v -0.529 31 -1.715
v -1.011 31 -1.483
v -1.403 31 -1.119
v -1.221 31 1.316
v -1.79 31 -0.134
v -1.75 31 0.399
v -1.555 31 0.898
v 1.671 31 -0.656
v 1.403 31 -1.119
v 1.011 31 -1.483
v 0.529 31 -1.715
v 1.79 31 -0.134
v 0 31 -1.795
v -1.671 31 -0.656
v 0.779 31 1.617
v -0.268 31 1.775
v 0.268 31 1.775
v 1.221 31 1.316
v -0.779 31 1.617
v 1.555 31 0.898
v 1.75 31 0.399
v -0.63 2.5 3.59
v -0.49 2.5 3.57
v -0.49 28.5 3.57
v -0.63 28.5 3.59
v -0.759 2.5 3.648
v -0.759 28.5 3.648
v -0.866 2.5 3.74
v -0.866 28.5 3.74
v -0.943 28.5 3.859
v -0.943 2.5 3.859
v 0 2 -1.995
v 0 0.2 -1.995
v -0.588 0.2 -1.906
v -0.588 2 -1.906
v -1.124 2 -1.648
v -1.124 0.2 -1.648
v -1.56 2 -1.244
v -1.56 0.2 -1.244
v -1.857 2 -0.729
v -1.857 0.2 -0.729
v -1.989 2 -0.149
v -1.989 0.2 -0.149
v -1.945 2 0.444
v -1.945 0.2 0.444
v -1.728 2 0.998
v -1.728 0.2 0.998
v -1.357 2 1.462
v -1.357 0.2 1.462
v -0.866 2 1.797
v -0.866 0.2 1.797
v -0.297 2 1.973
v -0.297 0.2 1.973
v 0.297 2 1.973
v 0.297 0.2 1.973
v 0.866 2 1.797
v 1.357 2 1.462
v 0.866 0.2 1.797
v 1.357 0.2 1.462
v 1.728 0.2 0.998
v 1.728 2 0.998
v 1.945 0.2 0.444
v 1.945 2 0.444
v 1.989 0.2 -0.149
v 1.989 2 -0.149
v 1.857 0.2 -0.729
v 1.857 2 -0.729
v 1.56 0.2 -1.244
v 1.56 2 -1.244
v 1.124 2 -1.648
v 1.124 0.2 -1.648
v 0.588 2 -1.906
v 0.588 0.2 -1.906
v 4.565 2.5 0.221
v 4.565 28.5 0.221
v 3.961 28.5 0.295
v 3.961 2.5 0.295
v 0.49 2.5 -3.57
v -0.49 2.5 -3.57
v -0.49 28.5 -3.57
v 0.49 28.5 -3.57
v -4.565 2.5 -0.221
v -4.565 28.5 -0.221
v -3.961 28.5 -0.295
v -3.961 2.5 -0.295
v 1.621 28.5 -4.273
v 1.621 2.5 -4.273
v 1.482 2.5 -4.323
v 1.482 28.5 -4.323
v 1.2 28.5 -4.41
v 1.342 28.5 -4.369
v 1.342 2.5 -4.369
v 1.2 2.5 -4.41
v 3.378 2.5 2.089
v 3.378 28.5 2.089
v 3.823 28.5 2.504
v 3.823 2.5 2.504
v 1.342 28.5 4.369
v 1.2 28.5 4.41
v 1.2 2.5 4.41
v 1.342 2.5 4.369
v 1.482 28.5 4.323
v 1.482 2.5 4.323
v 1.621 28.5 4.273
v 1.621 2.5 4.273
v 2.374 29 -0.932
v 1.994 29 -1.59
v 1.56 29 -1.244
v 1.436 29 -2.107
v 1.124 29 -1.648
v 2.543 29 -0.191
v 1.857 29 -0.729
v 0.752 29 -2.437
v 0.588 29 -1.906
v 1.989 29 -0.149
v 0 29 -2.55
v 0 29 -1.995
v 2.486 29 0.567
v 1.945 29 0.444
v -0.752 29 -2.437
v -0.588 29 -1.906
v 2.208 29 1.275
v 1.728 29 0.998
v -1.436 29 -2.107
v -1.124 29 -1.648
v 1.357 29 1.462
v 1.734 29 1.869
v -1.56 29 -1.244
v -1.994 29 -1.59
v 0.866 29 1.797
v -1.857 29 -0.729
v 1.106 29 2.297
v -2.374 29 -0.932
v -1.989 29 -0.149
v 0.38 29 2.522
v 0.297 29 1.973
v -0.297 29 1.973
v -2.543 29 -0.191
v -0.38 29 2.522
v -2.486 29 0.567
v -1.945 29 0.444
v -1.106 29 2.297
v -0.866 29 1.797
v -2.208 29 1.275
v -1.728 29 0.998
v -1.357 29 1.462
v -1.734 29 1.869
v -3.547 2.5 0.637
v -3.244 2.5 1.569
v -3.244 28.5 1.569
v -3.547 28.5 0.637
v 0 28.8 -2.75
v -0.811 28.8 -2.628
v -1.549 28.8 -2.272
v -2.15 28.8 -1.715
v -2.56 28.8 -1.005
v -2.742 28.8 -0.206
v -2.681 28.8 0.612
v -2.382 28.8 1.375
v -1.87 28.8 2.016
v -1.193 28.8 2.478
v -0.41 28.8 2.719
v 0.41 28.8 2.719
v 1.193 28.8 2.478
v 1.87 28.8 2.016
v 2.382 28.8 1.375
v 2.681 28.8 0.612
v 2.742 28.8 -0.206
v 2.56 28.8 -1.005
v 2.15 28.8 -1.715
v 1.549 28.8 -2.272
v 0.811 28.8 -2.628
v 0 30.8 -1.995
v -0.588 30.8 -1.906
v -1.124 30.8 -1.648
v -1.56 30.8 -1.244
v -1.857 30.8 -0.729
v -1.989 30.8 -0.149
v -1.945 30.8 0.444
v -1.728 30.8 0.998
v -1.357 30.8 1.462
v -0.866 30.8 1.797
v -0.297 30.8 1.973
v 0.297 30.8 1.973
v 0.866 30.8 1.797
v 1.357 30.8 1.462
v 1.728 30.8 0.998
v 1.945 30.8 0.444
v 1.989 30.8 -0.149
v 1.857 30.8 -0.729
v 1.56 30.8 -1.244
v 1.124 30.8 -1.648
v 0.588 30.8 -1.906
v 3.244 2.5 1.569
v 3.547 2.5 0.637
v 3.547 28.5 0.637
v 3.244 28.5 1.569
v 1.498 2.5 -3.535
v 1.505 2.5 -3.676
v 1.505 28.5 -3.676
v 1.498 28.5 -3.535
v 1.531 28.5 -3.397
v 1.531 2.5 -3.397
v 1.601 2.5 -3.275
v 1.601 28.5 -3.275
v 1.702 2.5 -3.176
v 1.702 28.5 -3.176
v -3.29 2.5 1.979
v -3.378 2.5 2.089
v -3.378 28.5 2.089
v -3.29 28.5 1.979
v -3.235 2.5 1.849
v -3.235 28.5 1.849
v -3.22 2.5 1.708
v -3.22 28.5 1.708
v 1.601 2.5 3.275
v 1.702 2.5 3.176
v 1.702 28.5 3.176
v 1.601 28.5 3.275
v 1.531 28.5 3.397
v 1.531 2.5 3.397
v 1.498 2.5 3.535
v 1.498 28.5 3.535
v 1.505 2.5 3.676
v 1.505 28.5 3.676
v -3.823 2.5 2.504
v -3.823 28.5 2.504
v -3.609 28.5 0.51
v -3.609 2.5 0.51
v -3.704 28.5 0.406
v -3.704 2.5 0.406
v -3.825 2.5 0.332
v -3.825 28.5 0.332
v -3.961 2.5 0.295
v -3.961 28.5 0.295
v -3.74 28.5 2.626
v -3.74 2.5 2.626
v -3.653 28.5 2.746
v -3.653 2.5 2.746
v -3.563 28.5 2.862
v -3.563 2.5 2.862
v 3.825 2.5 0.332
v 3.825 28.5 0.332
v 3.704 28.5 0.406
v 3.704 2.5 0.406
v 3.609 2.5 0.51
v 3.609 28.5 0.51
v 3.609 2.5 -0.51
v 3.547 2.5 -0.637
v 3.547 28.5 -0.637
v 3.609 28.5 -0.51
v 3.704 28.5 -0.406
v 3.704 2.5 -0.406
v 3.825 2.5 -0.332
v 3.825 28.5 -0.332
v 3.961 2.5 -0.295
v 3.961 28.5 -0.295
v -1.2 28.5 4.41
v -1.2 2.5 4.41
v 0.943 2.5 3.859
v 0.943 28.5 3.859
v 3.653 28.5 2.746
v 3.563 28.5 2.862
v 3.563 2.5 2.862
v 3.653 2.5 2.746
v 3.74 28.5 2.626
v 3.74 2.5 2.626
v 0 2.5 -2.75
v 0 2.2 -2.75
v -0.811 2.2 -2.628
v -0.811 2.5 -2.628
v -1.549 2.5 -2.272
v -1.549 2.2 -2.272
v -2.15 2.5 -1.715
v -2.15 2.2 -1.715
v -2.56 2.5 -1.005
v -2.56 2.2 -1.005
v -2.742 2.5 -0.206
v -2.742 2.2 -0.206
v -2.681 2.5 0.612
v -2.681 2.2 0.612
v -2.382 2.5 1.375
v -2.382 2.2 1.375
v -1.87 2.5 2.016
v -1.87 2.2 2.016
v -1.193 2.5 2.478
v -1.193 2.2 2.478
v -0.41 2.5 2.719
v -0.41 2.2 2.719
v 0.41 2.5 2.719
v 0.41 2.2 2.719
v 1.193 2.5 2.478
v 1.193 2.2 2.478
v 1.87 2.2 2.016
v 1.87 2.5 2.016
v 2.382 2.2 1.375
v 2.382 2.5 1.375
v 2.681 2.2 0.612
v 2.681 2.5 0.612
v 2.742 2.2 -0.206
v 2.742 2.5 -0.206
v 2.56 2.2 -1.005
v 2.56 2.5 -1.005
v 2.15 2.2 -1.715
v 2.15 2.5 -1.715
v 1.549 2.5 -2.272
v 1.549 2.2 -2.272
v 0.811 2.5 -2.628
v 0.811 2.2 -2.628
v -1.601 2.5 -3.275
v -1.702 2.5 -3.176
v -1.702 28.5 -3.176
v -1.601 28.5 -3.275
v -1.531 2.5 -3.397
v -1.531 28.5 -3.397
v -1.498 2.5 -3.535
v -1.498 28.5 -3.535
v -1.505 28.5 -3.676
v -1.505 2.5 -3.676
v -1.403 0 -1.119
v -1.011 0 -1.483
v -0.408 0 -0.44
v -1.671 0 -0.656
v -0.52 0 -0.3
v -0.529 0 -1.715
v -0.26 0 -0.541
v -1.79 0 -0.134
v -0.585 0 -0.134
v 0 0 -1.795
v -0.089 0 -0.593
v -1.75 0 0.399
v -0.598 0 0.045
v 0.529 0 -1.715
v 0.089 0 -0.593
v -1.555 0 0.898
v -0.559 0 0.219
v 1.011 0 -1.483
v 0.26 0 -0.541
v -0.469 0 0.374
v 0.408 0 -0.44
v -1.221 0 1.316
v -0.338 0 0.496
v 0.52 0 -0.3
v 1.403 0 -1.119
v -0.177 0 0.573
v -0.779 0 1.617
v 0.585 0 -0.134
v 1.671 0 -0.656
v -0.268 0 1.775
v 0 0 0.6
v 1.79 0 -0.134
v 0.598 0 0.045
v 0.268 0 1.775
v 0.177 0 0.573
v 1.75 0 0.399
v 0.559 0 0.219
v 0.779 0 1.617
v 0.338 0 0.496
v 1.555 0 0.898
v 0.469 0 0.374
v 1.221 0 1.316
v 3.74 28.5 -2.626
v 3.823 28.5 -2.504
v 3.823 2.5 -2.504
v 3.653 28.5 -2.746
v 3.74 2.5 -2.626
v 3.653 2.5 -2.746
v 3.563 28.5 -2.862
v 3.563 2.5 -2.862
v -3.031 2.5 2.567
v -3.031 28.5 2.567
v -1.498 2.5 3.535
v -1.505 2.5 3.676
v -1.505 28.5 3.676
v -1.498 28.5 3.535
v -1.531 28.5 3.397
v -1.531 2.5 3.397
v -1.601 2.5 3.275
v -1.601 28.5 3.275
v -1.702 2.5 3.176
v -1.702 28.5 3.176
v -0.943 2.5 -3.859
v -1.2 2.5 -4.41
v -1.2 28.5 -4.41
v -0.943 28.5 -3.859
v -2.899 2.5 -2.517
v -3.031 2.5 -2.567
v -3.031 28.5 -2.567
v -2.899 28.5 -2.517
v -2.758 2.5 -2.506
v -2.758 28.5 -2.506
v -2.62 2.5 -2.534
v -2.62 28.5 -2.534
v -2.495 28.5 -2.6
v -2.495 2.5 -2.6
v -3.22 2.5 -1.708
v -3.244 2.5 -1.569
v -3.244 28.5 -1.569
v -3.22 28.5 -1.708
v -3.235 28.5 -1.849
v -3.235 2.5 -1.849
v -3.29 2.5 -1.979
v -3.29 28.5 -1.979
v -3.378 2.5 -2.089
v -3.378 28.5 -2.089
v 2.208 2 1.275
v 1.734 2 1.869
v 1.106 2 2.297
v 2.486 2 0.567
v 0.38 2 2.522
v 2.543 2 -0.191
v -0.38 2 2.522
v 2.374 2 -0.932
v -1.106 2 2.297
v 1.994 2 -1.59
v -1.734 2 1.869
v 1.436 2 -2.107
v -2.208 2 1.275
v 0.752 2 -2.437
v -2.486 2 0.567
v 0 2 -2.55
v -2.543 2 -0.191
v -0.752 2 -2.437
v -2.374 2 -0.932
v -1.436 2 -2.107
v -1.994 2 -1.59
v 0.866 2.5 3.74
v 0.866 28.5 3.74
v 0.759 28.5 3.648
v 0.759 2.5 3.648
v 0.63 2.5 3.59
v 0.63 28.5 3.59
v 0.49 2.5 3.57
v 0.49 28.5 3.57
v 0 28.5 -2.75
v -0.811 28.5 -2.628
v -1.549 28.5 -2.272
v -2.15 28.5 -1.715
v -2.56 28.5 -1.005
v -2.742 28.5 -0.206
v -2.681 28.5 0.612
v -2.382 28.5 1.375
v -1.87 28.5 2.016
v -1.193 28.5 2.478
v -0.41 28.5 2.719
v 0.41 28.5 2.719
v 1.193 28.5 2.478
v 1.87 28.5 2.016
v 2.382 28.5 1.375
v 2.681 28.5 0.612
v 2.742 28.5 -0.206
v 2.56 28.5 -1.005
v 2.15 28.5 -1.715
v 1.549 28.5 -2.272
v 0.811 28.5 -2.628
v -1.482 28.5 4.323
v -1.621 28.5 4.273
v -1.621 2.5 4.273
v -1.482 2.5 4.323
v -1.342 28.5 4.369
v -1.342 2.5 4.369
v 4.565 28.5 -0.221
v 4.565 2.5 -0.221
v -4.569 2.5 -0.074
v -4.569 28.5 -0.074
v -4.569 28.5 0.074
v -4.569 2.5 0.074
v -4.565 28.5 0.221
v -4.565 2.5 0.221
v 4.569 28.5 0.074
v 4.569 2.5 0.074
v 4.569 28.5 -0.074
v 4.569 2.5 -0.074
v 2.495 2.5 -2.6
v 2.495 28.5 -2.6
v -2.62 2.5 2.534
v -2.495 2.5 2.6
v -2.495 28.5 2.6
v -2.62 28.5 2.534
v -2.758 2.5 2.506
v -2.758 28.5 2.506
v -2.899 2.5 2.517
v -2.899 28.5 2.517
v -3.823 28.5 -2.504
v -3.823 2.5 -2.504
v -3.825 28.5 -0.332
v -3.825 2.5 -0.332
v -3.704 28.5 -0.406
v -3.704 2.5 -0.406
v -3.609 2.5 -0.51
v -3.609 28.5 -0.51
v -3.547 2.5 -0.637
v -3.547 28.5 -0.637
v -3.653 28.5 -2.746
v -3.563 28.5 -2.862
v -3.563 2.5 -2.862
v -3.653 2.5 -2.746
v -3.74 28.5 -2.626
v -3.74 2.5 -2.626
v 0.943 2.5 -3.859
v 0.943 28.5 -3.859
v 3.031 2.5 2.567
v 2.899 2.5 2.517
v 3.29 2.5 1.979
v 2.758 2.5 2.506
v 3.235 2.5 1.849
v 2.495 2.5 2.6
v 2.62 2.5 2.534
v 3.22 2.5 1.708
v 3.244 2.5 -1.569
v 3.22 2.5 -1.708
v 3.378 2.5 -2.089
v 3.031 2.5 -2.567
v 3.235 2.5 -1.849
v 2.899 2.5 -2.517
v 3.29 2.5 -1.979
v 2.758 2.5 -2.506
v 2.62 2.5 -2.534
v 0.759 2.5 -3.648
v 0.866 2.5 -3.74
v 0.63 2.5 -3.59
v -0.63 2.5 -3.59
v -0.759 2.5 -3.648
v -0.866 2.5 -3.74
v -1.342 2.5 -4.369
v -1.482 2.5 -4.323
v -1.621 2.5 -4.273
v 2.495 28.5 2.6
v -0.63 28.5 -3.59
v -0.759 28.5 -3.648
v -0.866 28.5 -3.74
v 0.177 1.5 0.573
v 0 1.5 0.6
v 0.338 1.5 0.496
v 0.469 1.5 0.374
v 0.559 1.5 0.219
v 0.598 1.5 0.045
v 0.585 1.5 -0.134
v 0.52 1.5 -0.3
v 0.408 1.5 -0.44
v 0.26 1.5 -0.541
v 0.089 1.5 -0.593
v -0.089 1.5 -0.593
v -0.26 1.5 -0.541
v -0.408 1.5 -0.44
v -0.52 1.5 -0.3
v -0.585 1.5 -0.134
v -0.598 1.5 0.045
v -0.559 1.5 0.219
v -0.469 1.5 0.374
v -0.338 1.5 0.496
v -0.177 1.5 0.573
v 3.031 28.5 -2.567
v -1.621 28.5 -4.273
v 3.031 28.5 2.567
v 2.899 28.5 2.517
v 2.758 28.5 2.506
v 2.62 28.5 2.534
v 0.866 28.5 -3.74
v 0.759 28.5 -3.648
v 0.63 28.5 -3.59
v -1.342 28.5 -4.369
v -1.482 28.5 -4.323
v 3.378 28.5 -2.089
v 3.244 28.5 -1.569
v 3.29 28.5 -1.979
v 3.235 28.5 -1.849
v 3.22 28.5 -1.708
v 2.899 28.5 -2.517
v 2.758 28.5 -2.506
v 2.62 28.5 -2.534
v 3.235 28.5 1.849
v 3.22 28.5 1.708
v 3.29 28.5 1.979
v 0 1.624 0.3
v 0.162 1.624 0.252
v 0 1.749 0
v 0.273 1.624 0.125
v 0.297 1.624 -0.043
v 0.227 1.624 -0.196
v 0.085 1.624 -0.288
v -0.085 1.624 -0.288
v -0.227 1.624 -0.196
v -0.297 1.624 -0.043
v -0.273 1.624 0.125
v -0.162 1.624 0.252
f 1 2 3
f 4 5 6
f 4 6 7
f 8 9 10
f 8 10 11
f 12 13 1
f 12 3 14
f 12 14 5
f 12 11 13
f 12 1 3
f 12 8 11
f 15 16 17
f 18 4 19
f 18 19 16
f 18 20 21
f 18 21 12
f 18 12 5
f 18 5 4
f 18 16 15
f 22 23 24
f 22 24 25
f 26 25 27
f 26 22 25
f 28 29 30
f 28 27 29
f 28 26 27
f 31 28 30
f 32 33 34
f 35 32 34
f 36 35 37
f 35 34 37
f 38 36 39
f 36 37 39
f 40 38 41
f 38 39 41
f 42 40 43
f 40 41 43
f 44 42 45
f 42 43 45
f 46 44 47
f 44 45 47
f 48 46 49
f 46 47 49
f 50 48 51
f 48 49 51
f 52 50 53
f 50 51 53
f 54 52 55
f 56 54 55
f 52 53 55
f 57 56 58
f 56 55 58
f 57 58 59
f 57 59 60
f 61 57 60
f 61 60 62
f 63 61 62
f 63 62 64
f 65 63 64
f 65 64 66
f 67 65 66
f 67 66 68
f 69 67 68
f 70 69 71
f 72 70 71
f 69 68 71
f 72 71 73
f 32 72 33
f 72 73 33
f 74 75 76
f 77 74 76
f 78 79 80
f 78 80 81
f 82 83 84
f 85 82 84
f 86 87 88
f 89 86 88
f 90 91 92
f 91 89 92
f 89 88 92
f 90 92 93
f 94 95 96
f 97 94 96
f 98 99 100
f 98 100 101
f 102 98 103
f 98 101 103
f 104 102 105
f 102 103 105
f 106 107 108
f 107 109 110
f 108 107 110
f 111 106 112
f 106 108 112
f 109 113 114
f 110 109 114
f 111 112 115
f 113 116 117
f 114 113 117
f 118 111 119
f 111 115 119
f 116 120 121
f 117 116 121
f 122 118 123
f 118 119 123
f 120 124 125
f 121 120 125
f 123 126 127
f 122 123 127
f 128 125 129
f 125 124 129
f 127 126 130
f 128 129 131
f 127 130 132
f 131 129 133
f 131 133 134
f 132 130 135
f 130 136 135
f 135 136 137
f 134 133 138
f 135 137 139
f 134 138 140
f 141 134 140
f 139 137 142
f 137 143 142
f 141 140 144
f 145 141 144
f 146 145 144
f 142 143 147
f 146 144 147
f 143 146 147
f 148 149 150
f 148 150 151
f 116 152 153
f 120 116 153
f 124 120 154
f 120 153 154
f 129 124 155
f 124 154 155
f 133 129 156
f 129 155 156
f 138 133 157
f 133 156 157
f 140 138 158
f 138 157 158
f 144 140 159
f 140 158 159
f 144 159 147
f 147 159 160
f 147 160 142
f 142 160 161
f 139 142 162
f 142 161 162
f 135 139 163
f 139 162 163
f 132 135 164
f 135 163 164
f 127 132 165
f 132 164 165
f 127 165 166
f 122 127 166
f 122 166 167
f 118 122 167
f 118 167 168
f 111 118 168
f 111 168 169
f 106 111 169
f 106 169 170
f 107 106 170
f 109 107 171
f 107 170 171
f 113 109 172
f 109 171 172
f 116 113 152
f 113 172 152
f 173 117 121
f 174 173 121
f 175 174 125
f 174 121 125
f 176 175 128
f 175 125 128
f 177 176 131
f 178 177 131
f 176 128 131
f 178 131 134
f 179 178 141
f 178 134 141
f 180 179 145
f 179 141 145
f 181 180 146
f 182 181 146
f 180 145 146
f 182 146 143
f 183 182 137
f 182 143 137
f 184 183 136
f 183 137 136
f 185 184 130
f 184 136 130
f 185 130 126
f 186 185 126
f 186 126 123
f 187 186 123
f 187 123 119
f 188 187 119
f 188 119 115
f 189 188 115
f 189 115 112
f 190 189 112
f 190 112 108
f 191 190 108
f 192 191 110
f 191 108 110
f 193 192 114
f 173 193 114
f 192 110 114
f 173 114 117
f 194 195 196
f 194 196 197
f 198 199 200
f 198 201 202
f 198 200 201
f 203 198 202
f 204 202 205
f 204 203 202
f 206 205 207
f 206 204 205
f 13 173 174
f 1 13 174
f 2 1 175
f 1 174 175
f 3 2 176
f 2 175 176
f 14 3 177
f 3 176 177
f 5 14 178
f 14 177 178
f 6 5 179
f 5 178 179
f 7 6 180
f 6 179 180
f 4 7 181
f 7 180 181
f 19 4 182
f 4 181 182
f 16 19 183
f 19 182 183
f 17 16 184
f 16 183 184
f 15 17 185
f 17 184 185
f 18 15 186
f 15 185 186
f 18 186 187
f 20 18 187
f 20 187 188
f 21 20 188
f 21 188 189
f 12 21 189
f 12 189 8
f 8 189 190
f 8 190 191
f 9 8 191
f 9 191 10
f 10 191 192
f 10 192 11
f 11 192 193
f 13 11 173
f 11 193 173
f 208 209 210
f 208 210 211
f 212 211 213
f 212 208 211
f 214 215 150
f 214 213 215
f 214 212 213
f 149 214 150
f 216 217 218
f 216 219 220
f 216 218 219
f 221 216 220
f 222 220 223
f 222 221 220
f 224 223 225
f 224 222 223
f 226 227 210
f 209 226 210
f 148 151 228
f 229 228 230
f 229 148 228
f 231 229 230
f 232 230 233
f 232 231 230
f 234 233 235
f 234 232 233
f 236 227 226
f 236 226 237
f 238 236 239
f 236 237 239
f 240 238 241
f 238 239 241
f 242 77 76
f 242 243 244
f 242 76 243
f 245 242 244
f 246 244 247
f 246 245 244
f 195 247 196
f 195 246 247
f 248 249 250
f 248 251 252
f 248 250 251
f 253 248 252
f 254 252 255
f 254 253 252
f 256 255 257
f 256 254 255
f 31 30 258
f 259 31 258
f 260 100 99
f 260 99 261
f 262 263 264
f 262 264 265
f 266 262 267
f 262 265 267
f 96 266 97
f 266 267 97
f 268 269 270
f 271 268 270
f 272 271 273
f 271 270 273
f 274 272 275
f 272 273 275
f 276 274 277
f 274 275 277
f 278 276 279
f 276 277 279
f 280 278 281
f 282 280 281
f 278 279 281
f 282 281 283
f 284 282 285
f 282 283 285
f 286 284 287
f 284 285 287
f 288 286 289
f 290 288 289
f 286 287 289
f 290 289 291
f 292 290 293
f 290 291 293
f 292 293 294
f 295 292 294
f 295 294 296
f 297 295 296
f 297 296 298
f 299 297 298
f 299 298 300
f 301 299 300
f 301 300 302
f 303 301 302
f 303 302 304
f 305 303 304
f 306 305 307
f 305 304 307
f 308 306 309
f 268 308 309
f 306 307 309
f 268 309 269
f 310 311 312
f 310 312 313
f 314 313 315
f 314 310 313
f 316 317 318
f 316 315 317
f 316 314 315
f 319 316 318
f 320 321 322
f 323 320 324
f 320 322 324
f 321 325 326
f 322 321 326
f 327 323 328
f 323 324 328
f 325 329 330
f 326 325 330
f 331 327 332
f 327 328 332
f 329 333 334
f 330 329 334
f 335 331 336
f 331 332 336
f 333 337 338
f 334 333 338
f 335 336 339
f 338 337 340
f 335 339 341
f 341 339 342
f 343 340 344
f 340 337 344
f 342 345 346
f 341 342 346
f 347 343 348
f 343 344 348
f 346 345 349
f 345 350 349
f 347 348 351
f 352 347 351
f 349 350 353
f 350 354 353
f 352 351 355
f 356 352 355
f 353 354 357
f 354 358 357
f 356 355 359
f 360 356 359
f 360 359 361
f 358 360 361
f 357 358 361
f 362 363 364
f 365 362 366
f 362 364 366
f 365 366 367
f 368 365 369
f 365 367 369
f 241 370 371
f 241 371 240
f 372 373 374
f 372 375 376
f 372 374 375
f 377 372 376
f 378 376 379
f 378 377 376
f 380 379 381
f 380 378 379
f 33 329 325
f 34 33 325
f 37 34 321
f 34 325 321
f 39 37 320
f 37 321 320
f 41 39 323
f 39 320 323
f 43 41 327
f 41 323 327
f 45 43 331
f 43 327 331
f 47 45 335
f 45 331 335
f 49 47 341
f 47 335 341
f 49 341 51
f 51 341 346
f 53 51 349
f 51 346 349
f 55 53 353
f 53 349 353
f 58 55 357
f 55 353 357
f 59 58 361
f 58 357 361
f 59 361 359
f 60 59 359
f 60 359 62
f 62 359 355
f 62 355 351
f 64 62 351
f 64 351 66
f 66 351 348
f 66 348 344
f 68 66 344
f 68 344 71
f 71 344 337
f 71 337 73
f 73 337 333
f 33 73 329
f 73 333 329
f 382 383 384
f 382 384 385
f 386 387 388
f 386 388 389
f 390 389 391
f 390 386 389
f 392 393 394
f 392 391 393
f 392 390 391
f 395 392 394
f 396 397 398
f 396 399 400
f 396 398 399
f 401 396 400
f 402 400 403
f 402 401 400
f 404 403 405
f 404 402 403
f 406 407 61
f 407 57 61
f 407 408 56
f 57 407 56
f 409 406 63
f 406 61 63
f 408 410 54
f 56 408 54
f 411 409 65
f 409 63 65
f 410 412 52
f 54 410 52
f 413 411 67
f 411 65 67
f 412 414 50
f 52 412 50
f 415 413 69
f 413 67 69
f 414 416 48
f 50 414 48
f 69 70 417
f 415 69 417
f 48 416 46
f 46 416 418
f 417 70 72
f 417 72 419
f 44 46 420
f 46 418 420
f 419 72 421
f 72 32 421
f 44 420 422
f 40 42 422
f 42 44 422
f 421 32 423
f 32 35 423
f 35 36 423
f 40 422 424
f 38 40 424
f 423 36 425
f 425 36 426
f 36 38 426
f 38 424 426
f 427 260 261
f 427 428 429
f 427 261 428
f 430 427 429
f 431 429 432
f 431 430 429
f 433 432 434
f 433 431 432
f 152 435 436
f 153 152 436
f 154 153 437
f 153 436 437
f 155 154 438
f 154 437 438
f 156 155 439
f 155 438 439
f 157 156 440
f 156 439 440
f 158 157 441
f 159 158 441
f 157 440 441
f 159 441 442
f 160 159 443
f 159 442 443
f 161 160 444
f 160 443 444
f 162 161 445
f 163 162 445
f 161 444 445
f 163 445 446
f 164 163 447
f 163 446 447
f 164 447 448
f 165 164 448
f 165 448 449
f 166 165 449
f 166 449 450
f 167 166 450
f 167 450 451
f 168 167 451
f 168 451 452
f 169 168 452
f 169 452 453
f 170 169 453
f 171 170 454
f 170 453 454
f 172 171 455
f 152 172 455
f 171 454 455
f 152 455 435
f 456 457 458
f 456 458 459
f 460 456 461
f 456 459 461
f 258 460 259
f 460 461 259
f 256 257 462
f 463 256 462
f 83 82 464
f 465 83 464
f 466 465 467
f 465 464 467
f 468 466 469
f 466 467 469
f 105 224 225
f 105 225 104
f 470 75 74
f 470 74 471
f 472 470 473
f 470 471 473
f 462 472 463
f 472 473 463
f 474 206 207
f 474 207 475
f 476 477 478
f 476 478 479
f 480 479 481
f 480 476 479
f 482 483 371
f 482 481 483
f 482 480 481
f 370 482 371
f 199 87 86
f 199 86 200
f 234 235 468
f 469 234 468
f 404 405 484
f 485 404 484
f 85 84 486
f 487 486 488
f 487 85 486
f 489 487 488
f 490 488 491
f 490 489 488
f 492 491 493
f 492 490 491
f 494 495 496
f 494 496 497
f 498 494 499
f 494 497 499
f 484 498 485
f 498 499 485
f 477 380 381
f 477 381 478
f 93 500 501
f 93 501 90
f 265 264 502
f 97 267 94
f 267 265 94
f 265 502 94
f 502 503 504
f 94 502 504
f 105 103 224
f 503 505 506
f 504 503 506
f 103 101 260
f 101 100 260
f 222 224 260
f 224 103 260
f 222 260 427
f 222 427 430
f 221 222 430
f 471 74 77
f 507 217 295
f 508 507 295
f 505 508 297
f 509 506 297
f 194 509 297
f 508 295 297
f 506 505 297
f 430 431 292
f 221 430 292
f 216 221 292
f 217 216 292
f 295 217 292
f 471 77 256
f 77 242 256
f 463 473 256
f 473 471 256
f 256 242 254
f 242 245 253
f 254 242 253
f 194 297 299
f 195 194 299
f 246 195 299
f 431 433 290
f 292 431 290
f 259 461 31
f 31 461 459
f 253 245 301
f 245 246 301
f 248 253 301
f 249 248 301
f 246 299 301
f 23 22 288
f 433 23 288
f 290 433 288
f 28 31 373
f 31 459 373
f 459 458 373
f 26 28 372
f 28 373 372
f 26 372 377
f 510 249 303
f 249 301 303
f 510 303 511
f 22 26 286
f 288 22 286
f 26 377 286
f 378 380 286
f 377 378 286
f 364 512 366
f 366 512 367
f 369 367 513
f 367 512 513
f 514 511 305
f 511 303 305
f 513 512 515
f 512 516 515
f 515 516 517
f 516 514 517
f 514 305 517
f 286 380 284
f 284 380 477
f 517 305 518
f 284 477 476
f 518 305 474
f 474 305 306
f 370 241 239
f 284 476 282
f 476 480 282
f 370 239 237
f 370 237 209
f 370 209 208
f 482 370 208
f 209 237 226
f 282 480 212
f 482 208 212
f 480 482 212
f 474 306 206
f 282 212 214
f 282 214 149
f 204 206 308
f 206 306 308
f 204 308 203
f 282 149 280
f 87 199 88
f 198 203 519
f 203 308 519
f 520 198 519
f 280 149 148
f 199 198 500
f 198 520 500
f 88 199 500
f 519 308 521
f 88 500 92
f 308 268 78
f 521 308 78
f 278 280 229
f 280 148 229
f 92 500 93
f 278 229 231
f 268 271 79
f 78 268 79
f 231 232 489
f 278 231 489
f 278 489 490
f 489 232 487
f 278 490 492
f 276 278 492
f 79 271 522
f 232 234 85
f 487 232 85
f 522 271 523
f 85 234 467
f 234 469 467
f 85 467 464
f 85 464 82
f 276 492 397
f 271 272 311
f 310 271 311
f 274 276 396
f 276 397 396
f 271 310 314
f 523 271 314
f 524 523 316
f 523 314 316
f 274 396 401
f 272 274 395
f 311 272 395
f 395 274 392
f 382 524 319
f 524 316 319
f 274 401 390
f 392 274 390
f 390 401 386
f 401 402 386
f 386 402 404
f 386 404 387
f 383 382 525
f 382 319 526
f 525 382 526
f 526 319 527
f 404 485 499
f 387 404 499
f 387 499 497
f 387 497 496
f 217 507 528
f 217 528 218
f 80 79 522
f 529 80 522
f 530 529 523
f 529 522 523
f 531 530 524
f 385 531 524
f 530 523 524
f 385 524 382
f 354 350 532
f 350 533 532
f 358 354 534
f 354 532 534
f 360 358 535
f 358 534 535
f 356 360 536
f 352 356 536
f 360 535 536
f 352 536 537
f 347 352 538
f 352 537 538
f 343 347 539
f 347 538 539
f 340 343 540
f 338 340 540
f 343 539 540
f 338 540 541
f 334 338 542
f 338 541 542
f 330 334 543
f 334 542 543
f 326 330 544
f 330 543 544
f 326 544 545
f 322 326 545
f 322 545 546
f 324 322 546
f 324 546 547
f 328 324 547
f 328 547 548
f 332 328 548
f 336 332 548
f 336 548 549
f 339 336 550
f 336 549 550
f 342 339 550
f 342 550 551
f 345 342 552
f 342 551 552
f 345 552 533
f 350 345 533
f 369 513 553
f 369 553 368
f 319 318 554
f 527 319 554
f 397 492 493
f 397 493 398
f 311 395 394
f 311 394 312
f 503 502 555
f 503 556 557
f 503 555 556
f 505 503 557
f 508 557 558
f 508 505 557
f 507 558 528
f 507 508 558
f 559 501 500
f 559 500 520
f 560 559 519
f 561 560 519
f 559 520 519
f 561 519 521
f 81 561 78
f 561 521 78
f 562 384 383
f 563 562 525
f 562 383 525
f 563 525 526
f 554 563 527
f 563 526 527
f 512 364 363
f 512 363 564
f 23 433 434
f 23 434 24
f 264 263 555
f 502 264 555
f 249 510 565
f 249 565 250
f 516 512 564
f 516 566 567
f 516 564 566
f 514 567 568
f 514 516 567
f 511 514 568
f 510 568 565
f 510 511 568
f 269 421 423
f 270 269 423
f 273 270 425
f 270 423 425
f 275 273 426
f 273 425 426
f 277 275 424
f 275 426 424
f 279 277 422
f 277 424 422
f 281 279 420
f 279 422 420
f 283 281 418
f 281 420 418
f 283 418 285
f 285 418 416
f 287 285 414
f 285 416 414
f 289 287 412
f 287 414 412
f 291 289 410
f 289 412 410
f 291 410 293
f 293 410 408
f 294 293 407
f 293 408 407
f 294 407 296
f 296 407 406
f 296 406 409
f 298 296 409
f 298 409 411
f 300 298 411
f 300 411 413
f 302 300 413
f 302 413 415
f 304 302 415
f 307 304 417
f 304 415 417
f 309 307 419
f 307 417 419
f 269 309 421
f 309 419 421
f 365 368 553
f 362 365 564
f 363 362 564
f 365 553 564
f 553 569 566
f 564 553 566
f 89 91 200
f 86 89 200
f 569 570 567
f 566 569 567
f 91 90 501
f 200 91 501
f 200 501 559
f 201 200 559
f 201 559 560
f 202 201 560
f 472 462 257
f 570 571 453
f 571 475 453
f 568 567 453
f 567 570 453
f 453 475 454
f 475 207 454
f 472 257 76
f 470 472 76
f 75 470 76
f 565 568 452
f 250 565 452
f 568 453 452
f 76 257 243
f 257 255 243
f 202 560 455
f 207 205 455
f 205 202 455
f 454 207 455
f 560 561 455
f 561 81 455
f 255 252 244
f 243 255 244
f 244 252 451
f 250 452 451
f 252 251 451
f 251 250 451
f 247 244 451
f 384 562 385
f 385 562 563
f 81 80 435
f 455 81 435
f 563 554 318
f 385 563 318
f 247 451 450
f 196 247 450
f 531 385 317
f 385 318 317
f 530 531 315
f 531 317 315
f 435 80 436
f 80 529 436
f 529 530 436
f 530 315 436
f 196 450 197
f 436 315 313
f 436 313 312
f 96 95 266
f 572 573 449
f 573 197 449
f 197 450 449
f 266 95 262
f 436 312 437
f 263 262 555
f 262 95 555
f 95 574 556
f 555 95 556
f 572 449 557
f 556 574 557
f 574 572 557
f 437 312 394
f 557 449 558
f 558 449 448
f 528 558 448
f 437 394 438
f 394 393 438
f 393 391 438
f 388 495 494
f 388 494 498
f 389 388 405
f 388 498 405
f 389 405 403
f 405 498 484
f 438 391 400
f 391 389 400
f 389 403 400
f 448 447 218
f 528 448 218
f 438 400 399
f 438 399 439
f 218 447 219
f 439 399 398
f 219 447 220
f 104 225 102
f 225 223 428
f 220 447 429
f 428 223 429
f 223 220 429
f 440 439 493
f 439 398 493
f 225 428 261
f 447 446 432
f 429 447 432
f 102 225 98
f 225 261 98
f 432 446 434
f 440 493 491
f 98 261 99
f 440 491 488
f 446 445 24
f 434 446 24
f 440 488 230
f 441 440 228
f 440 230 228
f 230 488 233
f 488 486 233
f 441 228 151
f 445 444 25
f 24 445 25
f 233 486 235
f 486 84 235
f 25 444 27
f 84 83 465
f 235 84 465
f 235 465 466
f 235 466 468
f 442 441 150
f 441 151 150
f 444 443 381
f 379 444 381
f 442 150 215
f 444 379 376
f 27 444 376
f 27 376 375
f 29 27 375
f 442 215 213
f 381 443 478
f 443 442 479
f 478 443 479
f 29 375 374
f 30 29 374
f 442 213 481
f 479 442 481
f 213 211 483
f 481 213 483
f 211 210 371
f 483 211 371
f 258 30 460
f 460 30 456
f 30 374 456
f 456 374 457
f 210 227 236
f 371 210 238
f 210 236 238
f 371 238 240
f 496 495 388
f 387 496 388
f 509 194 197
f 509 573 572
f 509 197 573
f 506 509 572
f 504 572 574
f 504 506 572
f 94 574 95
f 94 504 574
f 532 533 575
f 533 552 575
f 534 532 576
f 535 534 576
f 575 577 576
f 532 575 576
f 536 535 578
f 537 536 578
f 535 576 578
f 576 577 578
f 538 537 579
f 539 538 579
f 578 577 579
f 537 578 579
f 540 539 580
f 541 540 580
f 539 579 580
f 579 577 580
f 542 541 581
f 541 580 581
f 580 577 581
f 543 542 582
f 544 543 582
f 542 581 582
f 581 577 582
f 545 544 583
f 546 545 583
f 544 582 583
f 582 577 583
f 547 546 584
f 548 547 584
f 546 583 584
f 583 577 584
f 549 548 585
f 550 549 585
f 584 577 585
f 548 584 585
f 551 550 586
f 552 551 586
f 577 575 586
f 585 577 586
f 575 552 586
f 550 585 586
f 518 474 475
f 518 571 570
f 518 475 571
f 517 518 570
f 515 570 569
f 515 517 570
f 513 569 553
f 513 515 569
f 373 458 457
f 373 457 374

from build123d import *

# Parameters (mm, degrees)
SKIZZE1_R                       = 4.57
AUFSATZ_LINEAR_AUSTRAGEN1_DEPTH = 31
SCHNITT_LINEAR_AUSTRAGEN1_DEPTH = 32.666540702
VERRUNDUNG1_R                   = 0.5
KREISMUSTER1_COUNT              = 10
VERRUNDUNG1_OF_KREISMUSTER1_R   = 0.5
FASE1_SIZE                      = 0.2


with BuildPart() as part:
    # Skizze1 → Aufsatz-Linear austragen1 (new body)
    with BuildSketch(Plane(origin=(0, 0, 0), x_dir=(1, 0, 0), z_dir=(0, 1, 0))):
        Circle(SKIZZE1_R)
    extrude(amount=AUFSATZ_LINEAR_AUSTRAGEN1_DEPTH)

    # Skizze12 → Schnitt-Linear austragen1 (cut, through all)
    with BuildSketch(Plane(origin=(0, 31, 0), x_dir=(1, 0, 0), z_dir=(0, 1, 0))):
        with BuildLine():
            Line((-1.2, 4.409637173), (-0.808470756, 3.57))
            Line((-0.808470756, 3.57), (0.808470756, 3.57))
            Line((0.808470756, 3.57), (1.2, 4.409637173))
            ThreePointArc((1.2, 4.409637173), (0, 4.57), (-1.2, 4.409637173))
        make_face()
    schnitt_linear_austragen1 = extrude(amount=-SCHNITT_LINEAR_AUSTRAGEN1_DEPTH, mode=Mode.SUBTRACT)

    # Verrundung1
    verrundung1_edges = [part.edges().sort_by_distance(p)[0] for p in [
        (-0.808470756, 15.5, -3.57),
        (0.808470756, 15.5, -3.57),
    ]]
    fillet(verrundung1_edges, radius=VERRUNDUNG1_R)

    # Kreismuster1: Schnitt-Linear austragen1 ×10 about axis
    kreismuster1_axis = Axis((0, -1.826859831, 0), (0, 1, 0))
    for i in range(1, KREISMUSTER1_COUNT):
        add(schnitt_linear_austragen1.rotate(kreismuster1_axis, i * 360 / KREISMUSTER1_COUNT), mode=Mode.SUBTRACT)

    # Verrundung1 of Kreismuster1
    verrundung1_of_kreismuster1_edges = [part.edges().sort_by_distance(p)[0] for p in [
        (-2.752459932, 15.5, -2.412983483),
        (-1.44432677, 15.5, -3.363397857),
        (-3.645102966, 15.5, -0.334289289),
        (-3.14544056, 15.5, -1.872092051),
        (-3.14544056, 15.5, 1.872092051),
        (-3.645102966, 15.5, 0.334289289),
        (-1.44432677, 15.5, 3.363397857),
        (-2.752459932, 15.5, 2.412983483),
        (0.808470756, 15.5, 3.57),
        (-0.808470756, 15.5, 3.57),
        (2.752459932, 15.5, 2.412983483),
        (1.44432677, 15.5, 3.363397857),
        (3.645102966, 15.5, 0.334289289),
        (3.14544056, 15.5, 1.872092051),
        (3.14544056, 15.5, -1.872092051),
        (3.645102966, 15.5, -0.334289289),
        (1.44432677, 15.5, -3.363397857),
        (2.752459932, 15.5, -2.412983483),
    ]]
    fillet(verrundung1_of_kreismuster1_edges, radius=VERRUNDUNG1_OF_KREISMUSTER1_R)

    # Skizze13 → Schnitt-Rotation1 (revolve, cut)
    with BuildSketch(Plane(origin=(0, 0, 0), x_dir=(0, 0, -1), z_dir=(1, 0, 0))):
        Polygon((-1.995, 0), (-10.076763041, 0), (-10.076763041, 31), (-1.995, 31), (-1.995, 29), (-2.75, 29), (-2.75, 28.5), (-6.450923694, 28.5), (-6.450923694, 2.5), (-2.75, 2.5), (-2.75, 2), (-1.995, 2), align=None)
    revolve(axis=Axis((0, -5.607699778, 0), (0, 1, 0)), mode=Mode.SUBTRACT)

    # Fase1
    fase1_edges = [part.edges().sort_by_distance(p)[0] for p in [
        (0, 0, -1.995),
        (0, 2, -2.75),
        (0, 29, -2.75),
        (0, 31, -1.995),
    ]]
    chamfer(fase1_edges, length=FASE1_SIZE)

    # Skizze14 → Schnitt-Rotation2 (revolve, cut)
    with BuildSketch(Plane(origin=(0, 0, 0), x_dir=(0, 0, -1), z_dir=(1, 0, 0))):
        Polygon((0, 0), (-0.6, 0), (-0.6, 1.5), (0, 1.748528137), align=None)
    revolve(axis=Axis((0, -2.816169131, 0), (0, 1, 0)), mode=Mode.SUBTRACT)


solid = part.part
